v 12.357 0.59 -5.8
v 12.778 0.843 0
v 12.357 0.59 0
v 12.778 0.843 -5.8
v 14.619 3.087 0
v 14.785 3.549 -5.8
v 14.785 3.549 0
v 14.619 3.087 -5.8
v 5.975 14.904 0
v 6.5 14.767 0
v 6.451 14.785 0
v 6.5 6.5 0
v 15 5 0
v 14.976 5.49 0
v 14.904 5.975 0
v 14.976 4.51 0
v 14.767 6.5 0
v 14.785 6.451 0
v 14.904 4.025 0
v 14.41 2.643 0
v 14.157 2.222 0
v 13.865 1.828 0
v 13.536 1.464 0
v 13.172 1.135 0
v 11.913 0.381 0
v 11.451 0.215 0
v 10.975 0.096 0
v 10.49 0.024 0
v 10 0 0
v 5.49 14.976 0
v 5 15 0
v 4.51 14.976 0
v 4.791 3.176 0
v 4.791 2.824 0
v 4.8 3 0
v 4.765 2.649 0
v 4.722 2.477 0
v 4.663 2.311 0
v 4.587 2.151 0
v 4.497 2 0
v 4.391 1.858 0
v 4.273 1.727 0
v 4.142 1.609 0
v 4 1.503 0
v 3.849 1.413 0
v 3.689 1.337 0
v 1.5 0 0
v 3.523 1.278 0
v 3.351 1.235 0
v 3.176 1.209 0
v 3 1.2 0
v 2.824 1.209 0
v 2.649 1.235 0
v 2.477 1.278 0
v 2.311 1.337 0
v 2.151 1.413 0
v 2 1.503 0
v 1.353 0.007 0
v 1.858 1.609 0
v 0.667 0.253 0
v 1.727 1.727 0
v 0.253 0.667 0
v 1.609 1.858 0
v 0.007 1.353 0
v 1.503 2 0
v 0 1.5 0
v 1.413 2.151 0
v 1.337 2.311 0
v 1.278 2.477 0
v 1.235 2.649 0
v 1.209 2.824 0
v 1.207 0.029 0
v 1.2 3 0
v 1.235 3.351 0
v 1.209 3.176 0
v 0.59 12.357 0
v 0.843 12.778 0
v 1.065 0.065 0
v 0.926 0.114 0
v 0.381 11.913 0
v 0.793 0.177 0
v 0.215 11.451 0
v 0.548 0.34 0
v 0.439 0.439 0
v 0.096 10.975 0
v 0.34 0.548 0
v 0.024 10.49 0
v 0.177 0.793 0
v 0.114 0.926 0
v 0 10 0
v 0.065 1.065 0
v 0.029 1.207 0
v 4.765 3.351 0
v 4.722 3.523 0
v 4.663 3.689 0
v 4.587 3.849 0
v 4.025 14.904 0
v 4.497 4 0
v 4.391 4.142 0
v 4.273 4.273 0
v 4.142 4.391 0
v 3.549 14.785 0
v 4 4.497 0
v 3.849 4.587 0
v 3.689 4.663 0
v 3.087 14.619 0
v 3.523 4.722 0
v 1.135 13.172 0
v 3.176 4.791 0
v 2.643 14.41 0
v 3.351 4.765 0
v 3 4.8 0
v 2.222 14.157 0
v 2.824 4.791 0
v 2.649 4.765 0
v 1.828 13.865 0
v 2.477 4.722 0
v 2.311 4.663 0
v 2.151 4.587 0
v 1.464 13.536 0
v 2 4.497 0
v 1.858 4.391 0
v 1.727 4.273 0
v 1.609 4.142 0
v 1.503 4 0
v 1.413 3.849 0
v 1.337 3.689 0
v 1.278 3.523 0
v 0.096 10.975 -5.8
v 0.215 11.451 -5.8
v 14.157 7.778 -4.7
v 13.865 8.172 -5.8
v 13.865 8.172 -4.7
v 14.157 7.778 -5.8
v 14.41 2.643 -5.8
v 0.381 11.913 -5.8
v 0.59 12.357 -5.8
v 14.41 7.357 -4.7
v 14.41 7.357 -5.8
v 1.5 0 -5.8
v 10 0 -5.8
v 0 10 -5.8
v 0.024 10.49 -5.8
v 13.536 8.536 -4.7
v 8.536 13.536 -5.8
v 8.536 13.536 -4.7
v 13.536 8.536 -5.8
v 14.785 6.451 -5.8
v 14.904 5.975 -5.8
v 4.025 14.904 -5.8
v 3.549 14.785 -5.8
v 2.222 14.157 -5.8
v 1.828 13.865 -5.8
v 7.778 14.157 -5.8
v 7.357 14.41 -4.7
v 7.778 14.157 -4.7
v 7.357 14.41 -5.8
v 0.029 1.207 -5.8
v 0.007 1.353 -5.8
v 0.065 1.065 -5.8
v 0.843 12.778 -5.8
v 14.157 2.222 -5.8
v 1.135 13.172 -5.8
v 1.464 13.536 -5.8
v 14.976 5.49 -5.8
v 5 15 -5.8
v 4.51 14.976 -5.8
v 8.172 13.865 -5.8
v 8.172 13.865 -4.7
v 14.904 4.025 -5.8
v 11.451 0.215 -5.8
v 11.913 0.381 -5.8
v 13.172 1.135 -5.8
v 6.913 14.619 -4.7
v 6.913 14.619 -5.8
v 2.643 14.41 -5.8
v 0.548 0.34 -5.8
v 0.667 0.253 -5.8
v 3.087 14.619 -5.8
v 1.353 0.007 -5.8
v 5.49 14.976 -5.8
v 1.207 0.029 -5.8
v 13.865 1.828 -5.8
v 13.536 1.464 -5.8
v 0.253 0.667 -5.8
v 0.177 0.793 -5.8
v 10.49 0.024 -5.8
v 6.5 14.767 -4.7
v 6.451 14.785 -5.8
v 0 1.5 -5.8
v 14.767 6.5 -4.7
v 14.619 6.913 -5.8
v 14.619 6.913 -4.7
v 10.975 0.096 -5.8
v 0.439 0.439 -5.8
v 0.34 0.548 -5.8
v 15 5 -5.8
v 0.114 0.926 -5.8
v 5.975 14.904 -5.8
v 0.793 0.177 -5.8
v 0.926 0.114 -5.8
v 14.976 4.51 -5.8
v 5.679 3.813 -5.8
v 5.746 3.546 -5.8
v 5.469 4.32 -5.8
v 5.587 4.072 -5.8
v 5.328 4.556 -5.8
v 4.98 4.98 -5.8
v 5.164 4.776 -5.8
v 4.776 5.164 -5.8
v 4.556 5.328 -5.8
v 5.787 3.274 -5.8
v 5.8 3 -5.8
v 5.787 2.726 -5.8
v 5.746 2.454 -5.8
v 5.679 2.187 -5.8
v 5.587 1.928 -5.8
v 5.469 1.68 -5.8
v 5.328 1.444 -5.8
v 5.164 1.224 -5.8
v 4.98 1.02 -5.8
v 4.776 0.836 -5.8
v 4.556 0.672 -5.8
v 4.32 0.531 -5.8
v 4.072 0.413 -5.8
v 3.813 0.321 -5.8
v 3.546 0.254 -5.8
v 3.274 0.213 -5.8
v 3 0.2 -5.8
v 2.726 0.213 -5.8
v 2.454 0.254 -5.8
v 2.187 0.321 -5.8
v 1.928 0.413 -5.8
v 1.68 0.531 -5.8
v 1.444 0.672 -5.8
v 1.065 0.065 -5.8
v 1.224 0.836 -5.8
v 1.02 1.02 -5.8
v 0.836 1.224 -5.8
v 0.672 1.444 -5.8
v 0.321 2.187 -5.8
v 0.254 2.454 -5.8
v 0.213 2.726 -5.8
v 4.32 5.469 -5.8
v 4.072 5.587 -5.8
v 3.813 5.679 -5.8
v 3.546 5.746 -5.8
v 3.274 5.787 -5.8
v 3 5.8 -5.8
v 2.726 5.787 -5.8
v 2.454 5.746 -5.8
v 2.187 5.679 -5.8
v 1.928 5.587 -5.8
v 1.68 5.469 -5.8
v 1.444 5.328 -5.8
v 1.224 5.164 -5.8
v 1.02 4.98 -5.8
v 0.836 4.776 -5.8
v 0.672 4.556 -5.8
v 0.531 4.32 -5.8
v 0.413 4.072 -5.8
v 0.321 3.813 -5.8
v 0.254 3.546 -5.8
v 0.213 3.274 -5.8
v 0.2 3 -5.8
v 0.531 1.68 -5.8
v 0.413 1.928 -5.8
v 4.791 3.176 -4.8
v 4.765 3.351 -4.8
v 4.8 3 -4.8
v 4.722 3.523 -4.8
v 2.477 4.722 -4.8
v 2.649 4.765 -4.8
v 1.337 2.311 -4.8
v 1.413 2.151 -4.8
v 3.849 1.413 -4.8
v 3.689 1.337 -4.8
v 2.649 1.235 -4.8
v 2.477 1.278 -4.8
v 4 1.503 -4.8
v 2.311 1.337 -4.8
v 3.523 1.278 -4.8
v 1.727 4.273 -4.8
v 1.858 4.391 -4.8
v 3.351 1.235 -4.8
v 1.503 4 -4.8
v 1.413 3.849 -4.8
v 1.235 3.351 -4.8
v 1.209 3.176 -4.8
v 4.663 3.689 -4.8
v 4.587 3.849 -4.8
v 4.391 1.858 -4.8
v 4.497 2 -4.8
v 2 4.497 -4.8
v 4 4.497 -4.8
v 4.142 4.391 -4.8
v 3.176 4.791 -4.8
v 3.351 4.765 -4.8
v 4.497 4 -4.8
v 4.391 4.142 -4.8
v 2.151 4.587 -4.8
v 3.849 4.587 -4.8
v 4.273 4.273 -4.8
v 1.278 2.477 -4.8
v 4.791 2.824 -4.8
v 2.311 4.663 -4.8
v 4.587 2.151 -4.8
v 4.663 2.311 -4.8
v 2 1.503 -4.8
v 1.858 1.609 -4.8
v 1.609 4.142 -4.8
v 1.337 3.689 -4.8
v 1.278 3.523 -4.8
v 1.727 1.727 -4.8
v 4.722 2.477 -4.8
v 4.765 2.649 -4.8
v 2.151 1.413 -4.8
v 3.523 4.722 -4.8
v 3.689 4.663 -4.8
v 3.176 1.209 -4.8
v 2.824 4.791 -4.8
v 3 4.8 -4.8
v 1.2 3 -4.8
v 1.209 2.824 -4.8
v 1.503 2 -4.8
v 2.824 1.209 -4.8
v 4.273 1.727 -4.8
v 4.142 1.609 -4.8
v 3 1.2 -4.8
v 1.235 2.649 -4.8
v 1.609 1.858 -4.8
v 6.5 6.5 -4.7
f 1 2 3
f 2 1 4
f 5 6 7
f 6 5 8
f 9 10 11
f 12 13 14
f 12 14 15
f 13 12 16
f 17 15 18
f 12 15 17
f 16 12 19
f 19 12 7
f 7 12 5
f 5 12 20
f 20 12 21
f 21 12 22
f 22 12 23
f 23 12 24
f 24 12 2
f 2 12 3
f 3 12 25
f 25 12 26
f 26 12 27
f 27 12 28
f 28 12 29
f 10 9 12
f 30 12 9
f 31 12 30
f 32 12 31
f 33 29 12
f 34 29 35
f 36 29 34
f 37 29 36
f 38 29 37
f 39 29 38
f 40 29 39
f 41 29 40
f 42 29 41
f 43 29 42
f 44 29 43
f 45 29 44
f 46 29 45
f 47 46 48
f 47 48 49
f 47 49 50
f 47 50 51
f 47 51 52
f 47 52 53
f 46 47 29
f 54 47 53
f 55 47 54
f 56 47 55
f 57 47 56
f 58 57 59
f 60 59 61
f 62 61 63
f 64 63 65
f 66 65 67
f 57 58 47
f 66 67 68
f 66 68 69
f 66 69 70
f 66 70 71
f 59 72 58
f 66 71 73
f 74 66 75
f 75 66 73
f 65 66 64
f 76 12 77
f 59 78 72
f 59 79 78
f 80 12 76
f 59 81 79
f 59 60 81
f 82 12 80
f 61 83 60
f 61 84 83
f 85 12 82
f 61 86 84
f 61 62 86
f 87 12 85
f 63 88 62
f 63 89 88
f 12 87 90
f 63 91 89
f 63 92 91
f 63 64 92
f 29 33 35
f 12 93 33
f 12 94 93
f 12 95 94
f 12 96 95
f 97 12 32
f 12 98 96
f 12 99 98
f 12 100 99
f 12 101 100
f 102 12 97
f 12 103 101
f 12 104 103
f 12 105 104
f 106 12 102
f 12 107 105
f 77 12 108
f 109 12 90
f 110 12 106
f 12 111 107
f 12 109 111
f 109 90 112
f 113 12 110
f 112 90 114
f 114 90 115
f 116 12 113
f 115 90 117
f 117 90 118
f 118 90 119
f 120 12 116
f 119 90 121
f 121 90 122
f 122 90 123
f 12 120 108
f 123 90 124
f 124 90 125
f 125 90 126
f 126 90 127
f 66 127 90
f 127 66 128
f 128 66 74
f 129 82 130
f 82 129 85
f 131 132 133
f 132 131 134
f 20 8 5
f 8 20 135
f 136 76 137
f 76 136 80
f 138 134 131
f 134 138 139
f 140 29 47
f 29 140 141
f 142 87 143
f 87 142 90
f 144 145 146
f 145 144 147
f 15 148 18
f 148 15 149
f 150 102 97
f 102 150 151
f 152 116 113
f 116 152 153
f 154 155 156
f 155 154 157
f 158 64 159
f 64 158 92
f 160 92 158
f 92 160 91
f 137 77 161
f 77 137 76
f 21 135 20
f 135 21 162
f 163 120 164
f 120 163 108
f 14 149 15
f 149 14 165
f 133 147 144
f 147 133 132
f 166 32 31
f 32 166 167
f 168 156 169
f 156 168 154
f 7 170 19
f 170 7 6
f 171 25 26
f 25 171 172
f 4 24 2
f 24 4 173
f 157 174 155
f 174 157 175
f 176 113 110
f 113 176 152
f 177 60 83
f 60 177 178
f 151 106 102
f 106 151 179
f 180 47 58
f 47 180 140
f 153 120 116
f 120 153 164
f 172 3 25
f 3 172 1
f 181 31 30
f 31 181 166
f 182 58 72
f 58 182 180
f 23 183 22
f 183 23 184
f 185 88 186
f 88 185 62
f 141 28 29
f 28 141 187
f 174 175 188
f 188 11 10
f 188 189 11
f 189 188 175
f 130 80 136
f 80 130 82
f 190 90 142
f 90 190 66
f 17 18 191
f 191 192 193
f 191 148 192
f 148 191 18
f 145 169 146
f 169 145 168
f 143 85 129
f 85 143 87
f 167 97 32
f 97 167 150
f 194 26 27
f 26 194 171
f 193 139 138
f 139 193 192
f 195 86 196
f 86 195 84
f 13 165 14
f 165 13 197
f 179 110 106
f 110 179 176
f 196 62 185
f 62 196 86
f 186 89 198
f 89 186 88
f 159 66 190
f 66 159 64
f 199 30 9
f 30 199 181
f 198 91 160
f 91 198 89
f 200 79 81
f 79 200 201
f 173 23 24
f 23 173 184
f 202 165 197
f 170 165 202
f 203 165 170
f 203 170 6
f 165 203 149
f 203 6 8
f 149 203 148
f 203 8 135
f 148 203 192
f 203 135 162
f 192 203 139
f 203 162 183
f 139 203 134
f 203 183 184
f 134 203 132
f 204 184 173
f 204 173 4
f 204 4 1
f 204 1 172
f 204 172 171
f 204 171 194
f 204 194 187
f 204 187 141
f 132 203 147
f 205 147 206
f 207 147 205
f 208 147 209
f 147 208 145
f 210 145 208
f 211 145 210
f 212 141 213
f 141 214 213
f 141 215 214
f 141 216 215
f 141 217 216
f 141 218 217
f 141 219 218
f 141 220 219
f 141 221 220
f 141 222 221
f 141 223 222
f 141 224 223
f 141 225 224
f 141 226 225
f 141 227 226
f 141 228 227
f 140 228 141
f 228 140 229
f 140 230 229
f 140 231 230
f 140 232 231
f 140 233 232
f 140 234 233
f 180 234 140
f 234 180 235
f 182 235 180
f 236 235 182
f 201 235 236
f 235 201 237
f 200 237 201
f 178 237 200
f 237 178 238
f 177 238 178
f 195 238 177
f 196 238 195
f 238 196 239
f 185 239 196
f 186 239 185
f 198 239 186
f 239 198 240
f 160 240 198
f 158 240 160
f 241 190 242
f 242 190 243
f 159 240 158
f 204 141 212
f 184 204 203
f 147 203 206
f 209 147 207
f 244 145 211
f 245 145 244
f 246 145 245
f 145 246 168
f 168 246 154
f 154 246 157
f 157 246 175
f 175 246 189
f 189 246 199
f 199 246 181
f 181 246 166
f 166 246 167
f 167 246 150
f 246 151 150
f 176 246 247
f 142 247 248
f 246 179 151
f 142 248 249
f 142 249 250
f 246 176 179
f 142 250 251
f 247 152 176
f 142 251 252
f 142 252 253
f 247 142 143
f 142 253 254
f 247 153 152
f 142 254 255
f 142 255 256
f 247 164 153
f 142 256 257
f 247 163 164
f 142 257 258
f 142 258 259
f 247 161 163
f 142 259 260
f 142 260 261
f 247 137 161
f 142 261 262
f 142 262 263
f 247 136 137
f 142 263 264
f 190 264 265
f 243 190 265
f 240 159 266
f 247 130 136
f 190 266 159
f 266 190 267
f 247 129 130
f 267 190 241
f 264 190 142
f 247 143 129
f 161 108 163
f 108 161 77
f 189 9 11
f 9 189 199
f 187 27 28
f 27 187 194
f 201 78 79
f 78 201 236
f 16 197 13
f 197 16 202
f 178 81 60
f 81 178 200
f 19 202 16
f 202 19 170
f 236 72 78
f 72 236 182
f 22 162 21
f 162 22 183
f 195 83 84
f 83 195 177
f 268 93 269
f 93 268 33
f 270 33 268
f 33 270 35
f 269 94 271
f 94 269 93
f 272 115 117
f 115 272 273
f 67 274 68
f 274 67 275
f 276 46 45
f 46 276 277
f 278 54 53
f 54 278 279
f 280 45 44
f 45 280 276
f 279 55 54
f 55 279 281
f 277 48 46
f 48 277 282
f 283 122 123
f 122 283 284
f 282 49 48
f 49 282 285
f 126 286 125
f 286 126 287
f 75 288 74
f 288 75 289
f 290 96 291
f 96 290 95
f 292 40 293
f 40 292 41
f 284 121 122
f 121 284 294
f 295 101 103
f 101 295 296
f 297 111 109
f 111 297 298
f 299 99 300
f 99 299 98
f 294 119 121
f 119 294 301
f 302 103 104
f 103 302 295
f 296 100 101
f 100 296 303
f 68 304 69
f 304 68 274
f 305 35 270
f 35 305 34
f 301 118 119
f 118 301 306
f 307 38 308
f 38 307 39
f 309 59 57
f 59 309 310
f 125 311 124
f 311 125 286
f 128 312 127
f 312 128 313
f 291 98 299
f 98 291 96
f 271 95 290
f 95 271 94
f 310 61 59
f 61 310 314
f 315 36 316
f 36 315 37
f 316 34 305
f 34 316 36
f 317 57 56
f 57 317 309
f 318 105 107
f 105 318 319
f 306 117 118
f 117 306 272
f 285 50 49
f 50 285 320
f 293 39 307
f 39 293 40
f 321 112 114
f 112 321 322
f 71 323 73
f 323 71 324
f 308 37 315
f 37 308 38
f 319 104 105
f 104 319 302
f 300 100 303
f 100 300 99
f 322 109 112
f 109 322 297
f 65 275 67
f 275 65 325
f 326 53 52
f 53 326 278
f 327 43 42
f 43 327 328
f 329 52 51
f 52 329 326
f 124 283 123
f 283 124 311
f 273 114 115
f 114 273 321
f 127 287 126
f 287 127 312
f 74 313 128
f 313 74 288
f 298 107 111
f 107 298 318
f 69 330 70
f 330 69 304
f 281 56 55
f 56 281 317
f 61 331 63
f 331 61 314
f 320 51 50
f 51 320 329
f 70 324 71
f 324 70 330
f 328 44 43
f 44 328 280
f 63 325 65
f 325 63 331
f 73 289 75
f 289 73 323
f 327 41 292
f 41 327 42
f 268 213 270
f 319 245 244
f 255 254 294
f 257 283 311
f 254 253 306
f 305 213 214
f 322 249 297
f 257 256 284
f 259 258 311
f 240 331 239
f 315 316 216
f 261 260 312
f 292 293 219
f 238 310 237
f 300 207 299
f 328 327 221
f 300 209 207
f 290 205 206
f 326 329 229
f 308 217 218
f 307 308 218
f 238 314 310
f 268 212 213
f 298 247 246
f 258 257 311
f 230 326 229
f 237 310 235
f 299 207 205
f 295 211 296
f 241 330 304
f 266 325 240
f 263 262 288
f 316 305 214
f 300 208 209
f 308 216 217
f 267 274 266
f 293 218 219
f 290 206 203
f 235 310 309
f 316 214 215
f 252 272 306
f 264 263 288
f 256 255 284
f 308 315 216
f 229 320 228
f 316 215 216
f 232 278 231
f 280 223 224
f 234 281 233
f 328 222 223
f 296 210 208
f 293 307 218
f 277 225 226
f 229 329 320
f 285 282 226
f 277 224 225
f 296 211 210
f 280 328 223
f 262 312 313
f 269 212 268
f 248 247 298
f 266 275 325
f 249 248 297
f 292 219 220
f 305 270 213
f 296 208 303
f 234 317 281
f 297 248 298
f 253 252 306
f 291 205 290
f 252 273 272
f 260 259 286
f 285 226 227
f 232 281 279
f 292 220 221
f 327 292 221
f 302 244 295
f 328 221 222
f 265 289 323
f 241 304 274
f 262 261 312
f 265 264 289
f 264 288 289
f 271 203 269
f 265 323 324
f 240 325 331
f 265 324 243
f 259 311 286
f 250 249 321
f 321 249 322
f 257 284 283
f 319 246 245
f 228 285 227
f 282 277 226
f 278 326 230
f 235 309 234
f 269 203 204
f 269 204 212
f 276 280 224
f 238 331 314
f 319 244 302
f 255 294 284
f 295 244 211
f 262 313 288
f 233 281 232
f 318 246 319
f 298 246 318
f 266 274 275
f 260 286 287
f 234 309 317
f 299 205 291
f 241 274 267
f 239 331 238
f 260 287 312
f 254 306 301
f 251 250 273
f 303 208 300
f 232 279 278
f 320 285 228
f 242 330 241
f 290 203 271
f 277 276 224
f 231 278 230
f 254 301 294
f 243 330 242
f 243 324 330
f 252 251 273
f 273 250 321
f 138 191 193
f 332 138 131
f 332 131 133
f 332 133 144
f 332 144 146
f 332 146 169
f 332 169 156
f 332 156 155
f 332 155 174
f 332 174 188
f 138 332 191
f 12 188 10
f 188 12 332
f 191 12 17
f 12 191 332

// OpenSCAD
$fn=64;
a=20; //сторона уголка
h=1; //высота уголка
hg=4.8; //толщина стекла
d=3.6; //диаметр отверстия
dd=3; //смещение отверстия для крепежа от края
dg=6+0.5; //расстояние от края столика до стекла
fac=10;//фаска
cfac=3;//фаска в углу

mirror([0,0,1])
difference(){
    
    hull(){
        translate([cfac/2,cfac/2,0])cylinder(d=cfac,h=hg+h);
        translate([a-fac,fac/2,0])cylinder(d=fac,h=hg+h);
        translate([fac/2,a-fac,0])cylinder(d=fac,h=hg+h);
    }
    //cube([a,a,hg+h]);
    translate([dd,dd,-0.1])cylinder(d=d,h=hg+h+0.2);
    translate([dd,dd,hg+h-1])cylinder(d1=d,d2=d+2,h=1);
    //translate([dd,dd,hg+h-2])cylinder(d=d+4,h=hg+h+0.2);
    //translate([dg,dg,-0.1])cube([a-dg*2,a-dg*2,hg]);
    translate([dg,dg,-0.1])cube([a-dg*2+fac,a-dg*2+fac,hg]);
    
    //linear_extrude(hg+h)polygon([[0,a],[a,0],[a,a]]);
}
